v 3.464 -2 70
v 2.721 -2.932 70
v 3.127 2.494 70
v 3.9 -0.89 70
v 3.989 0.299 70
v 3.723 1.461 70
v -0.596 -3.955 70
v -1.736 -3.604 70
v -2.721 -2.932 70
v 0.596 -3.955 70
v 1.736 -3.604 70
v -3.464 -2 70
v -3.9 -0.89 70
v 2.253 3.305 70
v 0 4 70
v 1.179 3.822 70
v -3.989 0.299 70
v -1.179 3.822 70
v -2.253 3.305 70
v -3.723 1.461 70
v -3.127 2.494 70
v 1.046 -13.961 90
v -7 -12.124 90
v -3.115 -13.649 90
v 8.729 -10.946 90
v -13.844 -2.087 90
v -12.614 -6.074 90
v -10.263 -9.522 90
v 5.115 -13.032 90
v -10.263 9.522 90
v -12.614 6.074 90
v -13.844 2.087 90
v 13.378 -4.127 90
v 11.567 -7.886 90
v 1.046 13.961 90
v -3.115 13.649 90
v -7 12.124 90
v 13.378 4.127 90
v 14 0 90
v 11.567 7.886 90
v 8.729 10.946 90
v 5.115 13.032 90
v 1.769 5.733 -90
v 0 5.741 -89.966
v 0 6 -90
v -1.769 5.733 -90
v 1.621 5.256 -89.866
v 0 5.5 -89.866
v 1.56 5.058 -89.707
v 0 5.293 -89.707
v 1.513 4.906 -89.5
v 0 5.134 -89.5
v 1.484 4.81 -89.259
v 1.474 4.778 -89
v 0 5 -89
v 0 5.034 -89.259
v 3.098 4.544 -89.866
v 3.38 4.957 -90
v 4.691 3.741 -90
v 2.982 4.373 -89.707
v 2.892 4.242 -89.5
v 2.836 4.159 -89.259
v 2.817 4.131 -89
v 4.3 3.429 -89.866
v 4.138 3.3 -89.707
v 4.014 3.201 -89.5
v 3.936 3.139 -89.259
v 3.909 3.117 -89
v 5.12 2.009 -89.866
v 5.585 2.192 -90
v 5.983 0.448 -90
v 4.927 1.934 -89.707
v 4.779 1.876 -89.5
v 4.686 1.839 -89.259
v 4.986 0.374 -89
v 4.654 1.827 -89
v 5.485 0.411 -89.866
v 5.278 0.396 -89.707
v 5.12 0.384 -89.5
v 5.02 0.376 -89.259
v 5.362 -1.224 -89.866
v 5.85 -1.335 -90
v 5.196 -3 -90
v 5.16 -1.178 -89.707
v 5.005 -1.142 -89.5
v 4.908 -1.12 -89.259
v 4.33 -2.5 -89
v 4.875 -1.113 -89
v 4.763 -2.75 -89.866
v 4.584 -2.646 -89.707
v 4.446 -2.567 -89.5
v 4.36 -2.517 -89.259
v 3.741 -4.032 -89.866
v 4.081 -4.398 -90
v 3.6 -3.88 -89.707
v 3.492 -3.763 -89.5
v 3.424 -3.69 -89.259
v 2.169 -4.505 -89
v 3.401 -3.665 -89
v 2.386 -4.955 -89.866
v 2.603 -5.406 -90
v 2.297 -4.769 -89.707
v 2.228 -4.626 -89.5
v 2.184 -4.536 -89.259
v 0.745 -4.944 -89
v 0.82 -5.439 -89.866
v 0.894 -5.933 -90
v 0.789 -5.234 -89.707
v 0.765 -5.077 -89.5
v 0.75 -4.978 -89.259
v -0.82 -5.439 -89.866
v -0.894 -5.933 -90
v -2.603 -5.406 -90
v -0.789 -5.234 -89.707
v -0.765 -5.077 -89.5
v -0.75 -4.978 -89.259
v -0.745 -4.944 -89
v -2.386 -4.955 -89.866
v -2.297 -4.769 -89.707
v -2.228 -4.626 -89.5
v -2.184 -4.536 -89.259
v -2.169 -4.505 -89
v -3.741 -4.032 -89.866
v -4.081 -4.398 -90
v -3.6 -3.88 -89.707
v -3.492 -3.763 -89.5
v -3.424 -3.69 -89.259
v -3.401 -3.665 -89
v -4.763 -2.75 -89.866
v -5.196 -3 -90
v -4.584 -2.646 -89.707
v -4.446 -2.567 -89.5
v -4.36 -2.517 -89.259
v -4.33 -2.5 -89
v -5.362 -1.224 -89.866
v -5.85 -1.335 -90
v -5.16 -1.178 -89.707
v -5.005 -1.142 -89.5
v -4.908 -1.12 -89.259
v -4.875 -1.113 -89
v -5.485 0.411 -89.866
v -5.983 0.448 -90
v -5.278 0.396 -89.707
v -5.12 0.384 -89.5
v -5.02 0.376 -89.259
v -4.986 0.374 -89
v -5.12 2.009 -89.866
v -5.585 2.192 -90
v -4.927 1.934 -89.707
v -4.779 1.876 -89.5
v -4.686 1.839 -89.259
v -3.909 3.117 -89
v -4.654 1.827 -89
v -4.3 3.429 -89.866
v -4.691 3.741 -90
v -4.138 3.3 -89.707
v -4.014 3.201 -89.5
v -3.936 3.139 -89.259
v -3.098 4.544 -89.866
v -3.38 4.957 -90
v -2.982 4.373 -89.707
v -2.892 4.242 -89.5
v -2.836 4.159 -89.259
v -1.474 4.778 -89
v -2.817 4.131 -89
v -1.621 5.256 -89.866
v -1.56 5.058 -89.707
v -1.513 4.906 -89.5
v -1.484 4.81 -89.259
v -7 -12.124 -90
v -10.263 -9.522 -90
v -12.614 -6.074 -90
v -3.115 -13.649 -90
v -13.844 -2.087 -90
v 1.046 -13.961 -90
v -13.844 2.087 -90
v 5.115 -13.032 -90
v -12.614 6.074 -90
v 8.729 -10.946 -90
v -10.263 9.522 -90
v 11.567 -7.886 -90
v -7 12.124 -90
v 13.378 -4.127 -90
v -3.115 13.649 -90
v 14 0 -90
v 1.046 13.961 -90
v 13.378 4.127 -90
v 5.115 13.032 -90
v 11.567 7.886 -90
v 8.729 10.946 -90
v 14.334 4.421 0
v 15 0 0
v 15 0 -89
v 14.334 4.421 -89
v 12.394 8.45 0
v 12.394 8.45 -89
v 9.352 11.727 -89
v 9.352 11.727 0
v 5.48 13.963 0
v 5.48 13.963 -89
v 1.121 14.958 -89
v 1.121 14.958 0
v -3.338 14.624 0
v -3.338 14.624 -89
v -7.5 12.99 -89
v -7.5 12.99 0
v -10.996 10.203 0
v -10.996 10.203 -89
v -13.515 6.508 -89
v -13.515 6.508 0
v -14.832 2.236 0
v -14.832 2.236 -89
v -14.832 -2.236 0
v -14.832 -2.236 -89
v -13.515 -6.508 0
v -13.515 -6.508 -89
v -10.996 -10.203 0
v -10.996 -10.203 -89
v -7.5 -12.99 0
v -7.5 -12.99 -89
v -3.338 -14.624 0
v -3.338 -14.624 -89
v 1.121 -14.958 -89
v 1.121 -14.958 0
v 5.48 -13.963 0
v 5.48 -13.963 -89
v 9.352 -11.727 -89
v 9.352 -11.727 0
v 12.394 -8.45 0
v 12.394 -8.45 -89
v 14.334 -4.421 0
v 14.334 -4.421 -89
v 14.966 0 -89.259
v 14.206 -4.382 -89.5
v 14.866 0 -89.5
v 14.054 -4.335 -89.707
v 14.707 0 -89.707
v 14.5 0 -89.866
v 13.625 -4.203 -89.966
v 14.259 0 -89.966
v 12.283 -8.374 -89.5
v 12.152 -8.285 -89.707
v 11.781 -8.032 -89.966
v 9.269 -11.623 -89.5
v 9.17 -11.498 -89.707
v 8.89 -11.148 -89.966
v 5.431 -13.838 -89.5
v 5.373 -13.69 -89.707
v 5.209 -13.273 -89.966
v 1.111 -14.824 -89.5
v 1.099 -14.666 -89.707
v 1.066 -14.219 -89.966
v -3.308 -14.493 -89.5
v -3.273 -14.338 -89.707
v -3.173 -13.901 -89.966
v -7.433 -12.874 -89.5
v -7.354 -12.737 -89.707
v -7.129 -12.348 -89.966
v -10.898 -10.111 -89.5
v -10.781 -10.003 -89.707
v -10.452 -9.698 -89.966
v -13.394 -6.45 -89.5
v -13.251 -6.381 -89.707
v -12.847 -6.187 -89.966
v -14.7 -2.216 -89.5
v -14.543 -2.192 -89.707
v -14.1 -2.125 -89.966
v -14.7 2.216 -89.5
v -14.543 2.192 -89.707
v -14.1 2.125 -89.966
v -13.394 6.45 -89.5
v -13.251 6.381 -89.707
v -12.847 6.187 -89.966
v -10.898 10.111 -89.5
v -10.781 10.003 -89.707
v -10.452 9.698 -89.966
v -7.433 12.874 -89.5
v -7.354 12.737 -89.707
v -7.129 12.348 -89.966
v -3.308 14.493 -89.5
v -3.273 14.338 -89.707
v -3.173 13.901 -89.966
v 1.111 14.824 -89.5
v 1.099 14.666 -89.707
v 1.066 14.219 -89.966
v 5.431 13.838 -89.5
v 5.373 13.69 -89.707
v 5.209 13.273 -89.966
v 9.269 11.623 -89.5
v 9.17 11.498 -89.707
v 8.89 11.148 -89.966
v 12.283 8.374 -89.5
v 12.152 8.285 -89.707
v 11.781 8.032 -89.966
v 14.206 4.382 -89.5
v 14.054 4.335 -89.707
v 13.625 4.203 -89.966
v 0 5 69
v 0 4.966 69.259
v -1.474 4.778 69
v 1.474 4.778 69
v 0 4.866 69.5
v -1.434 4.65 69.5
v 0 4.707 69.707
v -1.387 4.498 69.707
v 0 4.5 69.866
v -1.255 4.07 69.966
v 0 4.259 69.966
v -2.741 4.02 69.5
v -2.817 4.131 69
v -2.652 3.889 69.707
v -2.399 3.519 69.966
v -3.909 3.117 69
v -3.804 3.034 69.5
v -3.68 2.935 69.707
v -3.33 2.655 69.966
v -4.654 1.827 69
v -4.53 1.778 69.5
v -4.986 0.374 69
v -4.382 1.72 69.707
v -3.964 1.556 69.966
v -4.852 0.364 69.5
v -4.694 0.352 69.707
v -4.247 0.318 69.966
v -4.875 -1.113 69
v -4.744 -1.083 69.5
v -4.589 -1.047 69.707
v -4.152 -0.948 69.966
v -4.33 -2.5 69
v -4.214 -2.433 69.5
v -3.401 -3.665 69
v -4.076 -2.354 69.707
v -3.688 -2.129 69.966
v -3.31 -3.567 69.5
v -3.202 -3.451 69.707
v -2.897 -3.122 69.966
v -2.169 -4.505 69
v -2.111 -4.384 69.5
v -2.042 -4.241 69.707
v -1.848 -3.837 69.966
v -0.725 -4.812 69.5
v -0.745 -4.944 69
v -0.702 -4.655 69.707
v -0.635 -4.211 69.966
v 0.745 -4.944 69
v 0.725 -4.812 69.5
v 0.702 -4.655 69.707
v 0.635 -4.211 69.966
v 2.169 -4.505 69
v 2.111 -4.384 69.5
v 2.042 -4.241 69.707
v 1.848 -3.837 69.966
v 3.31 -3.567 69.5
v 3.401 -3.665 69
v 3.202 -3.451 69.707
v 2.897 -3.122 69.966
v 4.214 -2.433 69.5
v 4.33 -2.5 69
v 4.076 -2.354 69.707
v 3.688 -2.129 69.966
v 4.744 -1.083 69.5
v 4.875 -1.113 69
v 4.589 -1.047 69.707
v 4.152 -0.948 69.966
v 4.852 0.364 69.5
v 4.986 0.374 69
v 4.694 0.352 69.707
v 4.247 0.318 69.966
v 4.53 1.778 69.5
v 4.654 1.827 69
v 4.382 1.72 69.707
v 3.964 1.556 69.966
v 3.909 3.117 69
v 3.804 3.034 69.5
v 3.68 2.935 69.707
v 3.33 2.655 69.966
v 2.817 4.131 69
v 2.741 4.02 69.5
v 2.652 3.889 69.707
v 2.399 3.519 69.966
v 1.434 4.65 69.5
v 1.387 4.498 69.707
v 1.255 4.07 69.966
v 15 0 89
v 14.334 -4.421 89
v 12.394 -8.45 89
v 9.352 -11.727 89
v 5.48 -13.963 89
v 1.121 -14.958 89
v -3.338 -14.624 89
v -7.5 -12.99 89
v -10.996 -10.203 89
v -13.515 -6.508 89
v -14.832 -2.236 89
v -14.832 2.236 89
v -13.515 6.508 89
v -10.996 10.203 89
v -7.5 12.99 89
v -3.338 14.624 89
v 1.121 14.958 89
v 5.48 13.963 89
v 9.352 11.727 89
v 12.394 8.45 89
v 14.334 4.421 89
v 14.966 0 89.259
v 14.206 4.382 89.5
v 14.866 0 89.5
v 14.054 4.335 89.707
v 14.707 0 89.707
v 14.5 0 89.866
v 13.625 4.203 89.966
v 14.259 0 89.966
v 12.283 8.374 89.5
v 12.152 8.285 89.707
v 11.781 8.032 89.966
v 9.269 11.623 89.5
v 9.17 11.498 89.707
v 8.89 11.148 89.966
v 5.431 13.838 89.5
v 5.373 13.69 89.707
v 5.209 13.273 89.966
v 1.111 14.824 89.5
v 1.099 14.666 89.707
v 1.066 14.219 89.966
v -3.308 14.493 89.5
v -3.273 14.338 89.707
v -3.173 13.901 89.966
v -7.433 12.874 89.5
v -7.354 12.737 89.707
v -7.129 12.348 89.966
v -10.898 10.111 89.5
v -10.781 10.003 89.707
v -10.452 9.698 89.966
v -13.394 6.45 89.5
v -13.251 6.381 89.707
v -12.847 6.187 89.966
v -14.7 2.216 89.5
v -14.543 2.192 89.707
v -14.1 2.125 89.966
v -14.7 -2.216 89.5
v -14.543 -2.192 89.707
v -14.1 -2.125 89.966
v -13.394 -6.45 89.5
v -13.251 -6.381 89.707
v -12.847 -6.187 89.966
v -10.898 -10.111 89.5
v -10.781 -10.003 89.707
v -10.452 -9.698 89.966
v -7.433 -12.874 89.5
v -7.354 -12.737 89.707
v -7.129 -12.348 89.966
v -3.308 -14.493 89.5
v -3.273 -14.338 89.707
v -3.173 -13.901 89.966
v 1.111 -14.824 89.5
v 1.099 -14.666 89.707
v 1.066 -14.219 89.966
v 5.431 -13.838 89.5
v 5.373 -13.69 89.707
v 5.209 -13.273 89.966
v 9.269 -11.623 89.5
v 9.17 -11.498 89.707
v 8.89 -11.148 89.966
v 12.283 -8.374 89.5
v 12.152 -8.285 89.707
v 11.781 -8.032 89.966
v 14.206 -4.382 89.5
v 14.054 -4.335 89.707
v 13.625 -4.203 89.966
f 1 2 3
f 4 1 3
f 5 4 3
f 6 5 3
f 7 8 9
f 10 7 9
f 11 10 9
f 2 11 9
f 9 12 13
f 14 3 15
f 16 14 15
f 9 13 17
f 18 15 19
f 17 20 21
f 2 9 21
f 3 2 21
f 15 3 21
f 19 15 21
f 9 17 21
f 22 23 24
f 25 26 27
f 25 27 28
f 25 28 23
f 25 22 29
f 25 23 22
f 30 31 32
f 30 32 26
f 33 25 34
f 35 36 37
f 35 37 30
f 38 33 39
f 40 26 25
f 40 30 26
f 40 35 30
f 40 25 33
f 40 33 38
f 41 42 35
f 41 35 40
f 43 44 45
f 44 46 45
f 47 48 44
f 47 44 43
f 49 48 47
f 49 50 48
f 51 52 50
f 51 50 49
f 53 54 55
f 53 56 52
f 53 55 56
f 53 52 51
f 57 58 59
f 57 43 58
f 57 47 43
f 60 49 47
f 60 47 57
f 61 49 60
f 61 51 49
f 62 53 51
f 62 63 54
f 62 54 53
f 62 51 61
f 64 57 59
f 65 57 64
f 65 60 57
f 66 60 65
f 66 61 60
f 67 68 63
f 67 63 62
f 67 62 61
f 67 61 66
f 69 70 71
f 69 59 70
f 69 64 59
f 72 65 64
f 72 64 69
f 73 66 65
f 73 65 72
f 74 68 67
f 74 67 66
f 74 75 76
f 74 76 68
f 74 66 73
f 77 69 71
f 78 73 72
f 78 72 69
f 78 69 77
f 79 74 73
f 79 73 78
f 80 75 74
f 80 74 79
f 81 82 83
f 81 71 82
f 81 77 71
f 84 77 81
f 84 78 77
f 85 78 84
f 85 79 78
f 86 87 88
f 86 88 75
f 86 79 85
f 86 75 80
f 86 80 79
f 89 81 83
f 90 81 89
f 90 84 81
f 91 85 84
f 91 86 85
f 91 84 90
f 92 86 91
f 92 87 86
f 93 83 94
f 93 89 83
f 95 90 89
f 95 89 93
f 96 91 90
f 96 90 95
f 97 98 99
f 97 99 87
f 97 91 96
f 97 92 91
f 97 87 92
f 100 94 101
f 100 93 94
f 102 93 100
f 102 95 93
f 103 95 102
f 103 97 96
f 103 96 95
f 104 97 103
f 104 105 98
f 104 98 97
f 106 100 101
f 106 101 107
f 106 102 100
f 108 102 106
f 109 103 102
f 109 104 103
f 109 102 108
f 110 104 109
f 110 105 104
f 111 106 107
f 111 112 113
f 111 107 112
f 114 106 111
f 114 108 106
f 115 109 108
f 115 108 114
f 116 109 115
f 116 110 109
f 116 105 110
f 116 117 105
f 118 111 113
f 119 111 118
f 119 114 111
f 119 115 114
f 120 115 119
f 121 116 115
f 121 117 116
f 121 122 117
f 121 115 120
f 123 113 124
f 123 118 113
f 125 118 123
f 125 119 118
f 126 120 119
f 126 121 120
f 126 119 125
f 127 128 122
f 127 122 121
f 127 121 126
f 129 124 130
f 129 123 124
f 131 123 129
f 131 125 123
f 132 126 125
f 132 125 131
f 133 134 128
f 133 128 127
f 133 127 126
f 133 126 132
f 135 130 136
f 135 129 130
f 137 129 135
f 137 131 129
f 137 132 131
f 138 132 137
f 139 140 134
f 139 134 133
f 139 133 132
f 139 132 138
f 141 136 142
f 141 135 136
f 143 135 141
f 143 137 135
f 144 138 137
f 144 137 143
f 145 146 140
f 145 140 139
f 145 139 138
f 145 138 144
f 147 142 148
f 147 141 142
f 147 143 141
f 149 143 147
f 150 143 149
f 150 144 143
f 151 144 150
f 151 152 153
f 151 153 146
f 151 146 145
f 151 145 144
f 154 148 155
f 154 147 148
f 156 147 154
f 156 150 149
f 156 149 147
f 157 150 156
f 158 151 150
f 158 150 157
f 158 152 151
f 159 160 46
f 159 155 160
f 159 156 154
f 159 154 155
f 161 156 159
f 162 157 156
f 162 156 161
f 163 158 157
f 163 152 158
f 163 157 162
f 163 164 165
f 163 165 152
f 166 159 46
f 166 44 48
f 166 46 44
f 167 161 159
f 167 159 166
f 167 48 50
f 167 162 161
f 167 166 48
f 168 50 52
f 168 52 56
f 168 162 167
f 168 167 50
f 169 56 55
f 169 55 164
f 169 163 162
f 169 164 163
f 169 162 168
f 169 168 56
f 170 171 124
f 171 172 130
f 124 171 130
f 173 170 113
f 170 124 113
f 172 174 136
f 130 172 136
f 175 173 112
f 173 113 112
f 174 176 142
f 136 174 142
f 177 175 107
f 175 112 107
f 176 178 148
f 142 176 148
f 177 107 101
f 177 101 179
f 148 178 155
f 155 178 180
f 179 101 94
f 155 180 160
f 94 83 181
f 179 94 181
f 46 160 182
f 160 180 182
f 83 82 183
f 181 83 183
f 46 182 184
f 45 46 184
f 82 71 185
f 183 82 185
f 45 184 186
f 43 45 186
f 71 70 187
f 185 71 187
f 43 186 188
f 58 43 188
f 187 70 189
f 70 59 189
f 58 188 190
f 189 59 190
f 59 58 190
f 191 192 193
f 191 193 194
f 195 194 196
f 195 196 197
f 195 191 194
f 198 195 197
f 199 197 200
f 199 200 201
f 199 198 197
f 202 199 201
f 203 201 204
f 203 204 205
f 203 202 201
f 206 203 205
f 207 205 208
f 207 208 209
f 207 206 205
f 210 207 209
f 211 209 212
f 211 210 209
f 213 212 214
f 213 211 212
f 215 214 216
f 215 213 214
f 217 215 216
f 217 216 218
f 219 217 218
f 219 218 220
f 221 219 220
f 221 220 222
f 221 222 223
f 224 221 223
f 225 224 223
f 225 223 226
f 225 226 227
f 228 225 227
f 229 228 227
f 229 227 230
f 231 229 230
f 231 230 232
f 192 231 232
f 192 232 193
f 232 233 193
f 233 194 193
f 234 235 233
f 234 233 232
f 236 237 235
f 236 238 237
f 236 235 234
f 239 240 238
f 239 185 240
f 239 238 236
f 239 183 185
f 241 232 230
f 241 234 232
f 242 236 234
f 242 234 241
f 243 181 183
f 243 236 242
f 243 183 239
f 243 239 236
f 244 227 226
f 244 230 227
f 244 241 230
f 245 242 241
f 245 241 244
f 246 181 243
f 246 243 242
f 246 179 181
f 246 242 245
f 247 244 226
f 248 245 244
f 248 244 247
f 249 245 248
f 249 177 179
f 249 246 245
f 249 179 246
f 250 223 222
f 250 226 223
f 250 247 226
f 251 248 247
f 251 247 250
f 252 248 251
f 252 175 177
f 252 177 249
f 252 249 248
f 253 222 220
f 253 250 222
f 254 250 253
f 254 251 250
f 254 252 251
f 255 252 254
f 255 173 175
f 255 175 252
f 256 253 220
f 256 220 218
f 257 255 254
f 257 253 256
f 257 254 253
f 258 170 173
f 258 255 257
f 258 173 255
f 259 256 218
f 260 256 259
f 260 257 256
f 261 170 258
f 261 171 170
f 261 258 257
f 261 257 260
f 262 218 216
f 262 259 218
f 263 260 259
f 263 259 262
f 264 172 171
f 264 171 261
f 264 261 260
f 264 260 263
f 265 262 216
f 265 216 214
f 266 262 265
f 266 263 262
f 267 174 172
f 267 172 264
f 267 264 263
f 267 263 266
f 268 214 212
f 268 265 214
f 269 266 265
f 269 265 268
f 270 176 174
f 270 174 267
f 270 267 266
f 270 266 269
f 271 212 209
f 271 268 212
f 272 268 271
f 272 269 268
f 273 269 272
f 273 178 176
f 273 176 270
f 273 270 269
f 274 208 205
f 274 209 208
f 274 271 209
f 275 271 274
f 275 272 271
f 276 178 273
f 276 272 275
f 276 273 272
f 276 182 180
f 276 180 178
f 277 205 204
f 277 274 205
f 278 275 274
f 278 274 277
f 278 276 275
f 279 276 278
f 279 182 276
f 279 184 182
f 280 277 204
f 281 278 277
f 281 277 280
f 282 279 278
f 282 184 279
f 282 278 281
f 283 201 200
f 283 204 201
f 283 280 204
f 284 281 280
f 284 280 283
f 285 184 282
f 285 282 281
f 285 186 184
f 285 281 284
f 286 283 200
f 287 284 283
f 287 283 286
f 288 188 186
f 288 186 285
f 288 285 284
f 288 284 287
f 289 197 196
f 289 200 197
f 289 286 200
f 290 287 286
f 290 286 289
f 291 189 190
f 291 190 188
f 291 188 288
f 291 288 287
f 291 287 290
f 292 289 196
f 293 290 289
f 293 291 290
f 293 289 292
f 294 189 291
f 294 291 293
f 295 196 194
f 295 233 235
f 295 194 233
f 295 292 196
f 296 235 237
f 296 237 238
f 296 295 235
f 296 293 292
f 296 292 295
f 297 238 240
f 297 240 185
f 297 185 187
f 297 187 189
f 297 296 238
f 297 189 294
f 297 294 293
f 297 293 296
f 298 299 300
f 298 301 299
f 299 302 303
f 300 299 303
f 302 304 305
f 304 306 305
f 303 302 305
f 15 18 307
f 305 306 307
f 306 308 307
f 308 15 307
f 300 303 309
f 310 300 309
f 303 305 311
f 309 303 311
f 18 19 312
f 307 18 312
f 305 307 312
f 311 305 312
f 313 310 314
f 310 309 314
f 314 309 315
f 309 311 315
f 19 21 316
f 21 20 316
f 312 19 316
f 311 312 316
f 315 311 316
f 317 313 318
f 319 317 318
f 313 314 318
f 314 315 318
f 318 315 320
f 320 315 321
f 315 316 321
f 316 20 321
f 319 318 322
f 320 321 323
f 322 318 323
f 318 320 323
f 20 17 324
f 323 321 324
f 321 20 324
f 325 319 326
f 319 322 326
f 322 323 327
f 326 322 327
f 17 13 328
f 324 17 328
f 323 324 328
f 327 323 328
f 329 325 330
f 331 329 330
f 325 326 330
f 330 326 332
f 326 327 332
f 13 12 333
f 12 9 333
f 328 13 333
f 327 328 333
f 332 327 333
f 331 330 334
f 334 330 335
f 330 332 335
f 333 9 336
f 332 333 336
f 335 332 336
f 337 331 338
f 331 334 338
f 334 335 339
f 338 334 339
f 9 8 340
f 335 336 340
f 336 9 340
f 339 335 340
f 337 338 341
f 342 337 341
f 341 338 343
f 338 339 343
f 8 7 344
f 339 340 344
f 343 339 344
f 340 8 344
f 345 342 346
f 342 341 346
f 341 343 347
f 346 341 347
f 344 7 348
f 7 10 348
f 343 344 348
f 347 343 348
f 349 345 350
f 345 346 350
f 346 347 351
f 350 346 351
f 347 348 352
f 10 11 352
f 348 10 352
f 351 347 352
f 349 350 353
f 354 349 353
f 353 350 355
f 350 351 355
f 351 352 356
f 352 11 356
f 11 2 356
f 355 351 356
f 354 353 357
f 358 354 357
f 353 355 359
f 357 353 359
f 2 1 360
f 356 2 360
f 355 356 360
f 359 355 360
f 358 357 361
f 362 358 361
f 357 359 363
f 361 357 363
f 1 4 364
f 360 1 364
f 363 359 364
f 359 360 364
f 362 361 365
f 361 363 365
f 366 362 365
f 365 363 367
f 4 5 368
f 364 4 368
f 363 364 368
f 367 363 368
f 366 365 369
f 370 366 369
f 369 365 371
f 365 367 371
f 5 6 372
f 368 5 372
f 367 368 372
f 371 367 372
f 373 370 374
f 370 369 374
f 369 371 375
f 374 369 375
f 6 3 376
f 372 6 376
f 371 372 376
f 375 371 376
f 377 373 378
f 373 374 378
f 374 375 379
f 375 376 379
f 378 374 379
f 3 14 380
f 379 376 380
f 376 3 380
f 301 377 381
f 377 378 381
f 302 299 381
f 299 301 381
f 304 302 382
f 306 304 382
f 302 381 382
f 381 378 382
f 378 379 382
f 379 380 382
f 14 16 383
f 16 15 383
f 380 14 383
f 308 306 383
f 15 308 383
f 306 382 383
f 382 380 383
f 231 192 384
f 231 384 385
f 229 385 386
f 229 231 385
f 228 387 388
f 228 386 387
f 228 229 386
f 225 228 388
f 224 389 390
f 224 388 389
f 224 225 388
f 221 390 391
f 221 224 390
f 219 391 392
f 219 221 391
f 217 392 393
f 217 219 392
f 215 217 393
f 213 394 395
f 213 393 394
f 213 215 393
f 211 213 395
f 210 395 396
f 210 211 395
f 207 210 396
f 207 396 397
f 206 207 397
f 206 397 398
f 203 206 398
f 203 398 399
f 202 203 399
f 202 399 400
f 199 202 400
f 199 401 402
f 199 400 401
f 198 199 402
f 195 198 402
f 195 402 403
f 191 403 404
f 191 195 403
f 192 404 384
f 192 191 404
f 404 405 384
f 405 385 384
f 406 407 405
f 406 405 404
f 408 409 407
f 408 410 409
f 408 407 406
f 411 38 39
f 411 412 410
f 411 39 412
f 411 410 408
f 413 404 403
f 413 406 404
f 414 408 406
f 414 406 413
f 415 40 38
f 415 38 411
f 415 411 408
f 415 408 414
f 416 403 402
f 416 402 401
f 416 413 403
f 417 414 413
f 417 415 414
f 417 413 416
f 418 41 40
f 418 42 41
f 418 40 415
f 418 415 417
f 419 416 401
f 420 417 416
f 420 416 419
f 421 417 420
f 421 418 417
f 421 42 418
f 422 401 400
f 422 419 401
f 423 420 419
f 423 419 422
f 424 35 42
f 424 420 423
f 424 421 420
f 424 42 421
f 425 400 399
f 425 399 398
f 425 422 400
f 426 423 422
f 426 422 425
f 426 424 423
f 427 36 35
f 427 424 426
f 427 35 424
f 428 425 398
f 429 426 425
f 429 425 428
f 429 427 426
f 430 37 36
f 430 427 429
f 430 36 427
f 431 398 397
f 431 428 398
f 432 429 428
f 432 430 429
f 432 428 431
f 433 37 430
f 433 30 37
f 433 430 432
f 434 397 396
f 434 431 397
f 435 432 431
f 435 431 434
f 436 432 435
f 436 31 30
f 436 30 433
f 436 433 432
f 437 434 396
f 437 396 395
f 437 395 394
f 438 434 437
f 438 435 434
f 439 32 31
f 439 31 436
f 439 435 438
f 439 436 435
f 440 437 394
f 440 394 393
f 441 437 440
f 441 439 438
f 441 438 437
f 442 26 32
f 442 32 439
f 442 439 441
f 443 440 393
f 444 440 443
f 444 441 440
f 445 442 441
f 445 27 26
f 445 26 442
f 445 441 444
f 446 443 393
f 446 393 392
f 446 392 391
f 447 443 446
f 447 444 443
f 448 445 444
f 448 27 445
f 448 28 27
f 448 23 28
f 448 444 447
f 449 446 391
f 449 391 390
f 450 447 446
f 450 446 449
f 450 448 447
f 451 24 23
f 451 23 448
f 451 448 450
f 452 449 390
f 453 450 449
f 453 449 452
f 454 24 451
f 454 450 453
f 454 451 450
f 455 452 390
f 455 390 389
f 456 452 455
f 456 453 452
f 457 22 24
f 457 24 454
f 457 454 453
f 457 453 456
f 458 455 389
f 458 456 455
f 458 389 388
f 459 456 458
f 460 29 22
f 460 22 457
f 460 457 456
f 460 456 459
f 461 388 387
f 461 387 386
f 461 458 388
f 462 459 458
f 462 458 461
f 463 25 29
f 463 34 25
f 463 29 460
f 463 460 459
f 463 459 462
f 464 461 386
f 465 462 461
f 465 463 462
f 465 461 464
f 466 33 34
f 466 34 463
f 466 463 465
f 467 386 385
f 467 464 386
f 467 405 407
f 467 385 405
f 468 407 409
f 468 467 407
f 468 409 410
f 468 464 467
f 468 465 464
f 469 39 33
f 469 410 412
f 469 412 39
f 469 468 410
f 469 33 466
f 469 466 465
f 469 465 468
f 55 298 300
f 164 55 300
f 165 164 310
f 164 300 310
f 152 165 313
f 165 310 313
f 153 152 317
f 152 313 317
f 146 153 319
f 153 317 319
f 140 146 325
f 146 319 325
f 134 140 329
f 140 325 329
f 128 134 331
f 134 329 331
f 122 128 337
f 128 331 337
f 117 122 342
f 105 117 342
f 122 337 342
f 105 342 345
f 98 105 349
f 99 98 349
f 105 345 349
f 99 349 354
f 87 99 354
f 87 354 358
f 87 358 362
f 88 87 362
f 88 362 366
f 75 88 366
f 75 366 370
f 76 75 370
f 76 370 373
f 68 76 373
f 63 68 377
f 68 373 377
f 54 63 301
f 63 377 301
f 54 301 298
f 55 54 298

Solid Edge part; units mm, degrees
sketch "Sketch1" plane through (0, 0, 0) normal (0, 0, 1) x (1, 0, 0)
  circle A0 centre (0, 0) radius 15
  dimension "D1" = 30
extrude "Protrusion1" add sketch "Sketch1" along normal mid plane 180
hole "Bohrung_1" at (0, 0, -90) direction (0, 0, 1) diameter 10 depth 160
fillet "Round1" radius 1 4 edges at (-15, 0, 90) (-15, 0, -90) (0, -5, -90) (0, -5, 70)
properties material "Grafit"
